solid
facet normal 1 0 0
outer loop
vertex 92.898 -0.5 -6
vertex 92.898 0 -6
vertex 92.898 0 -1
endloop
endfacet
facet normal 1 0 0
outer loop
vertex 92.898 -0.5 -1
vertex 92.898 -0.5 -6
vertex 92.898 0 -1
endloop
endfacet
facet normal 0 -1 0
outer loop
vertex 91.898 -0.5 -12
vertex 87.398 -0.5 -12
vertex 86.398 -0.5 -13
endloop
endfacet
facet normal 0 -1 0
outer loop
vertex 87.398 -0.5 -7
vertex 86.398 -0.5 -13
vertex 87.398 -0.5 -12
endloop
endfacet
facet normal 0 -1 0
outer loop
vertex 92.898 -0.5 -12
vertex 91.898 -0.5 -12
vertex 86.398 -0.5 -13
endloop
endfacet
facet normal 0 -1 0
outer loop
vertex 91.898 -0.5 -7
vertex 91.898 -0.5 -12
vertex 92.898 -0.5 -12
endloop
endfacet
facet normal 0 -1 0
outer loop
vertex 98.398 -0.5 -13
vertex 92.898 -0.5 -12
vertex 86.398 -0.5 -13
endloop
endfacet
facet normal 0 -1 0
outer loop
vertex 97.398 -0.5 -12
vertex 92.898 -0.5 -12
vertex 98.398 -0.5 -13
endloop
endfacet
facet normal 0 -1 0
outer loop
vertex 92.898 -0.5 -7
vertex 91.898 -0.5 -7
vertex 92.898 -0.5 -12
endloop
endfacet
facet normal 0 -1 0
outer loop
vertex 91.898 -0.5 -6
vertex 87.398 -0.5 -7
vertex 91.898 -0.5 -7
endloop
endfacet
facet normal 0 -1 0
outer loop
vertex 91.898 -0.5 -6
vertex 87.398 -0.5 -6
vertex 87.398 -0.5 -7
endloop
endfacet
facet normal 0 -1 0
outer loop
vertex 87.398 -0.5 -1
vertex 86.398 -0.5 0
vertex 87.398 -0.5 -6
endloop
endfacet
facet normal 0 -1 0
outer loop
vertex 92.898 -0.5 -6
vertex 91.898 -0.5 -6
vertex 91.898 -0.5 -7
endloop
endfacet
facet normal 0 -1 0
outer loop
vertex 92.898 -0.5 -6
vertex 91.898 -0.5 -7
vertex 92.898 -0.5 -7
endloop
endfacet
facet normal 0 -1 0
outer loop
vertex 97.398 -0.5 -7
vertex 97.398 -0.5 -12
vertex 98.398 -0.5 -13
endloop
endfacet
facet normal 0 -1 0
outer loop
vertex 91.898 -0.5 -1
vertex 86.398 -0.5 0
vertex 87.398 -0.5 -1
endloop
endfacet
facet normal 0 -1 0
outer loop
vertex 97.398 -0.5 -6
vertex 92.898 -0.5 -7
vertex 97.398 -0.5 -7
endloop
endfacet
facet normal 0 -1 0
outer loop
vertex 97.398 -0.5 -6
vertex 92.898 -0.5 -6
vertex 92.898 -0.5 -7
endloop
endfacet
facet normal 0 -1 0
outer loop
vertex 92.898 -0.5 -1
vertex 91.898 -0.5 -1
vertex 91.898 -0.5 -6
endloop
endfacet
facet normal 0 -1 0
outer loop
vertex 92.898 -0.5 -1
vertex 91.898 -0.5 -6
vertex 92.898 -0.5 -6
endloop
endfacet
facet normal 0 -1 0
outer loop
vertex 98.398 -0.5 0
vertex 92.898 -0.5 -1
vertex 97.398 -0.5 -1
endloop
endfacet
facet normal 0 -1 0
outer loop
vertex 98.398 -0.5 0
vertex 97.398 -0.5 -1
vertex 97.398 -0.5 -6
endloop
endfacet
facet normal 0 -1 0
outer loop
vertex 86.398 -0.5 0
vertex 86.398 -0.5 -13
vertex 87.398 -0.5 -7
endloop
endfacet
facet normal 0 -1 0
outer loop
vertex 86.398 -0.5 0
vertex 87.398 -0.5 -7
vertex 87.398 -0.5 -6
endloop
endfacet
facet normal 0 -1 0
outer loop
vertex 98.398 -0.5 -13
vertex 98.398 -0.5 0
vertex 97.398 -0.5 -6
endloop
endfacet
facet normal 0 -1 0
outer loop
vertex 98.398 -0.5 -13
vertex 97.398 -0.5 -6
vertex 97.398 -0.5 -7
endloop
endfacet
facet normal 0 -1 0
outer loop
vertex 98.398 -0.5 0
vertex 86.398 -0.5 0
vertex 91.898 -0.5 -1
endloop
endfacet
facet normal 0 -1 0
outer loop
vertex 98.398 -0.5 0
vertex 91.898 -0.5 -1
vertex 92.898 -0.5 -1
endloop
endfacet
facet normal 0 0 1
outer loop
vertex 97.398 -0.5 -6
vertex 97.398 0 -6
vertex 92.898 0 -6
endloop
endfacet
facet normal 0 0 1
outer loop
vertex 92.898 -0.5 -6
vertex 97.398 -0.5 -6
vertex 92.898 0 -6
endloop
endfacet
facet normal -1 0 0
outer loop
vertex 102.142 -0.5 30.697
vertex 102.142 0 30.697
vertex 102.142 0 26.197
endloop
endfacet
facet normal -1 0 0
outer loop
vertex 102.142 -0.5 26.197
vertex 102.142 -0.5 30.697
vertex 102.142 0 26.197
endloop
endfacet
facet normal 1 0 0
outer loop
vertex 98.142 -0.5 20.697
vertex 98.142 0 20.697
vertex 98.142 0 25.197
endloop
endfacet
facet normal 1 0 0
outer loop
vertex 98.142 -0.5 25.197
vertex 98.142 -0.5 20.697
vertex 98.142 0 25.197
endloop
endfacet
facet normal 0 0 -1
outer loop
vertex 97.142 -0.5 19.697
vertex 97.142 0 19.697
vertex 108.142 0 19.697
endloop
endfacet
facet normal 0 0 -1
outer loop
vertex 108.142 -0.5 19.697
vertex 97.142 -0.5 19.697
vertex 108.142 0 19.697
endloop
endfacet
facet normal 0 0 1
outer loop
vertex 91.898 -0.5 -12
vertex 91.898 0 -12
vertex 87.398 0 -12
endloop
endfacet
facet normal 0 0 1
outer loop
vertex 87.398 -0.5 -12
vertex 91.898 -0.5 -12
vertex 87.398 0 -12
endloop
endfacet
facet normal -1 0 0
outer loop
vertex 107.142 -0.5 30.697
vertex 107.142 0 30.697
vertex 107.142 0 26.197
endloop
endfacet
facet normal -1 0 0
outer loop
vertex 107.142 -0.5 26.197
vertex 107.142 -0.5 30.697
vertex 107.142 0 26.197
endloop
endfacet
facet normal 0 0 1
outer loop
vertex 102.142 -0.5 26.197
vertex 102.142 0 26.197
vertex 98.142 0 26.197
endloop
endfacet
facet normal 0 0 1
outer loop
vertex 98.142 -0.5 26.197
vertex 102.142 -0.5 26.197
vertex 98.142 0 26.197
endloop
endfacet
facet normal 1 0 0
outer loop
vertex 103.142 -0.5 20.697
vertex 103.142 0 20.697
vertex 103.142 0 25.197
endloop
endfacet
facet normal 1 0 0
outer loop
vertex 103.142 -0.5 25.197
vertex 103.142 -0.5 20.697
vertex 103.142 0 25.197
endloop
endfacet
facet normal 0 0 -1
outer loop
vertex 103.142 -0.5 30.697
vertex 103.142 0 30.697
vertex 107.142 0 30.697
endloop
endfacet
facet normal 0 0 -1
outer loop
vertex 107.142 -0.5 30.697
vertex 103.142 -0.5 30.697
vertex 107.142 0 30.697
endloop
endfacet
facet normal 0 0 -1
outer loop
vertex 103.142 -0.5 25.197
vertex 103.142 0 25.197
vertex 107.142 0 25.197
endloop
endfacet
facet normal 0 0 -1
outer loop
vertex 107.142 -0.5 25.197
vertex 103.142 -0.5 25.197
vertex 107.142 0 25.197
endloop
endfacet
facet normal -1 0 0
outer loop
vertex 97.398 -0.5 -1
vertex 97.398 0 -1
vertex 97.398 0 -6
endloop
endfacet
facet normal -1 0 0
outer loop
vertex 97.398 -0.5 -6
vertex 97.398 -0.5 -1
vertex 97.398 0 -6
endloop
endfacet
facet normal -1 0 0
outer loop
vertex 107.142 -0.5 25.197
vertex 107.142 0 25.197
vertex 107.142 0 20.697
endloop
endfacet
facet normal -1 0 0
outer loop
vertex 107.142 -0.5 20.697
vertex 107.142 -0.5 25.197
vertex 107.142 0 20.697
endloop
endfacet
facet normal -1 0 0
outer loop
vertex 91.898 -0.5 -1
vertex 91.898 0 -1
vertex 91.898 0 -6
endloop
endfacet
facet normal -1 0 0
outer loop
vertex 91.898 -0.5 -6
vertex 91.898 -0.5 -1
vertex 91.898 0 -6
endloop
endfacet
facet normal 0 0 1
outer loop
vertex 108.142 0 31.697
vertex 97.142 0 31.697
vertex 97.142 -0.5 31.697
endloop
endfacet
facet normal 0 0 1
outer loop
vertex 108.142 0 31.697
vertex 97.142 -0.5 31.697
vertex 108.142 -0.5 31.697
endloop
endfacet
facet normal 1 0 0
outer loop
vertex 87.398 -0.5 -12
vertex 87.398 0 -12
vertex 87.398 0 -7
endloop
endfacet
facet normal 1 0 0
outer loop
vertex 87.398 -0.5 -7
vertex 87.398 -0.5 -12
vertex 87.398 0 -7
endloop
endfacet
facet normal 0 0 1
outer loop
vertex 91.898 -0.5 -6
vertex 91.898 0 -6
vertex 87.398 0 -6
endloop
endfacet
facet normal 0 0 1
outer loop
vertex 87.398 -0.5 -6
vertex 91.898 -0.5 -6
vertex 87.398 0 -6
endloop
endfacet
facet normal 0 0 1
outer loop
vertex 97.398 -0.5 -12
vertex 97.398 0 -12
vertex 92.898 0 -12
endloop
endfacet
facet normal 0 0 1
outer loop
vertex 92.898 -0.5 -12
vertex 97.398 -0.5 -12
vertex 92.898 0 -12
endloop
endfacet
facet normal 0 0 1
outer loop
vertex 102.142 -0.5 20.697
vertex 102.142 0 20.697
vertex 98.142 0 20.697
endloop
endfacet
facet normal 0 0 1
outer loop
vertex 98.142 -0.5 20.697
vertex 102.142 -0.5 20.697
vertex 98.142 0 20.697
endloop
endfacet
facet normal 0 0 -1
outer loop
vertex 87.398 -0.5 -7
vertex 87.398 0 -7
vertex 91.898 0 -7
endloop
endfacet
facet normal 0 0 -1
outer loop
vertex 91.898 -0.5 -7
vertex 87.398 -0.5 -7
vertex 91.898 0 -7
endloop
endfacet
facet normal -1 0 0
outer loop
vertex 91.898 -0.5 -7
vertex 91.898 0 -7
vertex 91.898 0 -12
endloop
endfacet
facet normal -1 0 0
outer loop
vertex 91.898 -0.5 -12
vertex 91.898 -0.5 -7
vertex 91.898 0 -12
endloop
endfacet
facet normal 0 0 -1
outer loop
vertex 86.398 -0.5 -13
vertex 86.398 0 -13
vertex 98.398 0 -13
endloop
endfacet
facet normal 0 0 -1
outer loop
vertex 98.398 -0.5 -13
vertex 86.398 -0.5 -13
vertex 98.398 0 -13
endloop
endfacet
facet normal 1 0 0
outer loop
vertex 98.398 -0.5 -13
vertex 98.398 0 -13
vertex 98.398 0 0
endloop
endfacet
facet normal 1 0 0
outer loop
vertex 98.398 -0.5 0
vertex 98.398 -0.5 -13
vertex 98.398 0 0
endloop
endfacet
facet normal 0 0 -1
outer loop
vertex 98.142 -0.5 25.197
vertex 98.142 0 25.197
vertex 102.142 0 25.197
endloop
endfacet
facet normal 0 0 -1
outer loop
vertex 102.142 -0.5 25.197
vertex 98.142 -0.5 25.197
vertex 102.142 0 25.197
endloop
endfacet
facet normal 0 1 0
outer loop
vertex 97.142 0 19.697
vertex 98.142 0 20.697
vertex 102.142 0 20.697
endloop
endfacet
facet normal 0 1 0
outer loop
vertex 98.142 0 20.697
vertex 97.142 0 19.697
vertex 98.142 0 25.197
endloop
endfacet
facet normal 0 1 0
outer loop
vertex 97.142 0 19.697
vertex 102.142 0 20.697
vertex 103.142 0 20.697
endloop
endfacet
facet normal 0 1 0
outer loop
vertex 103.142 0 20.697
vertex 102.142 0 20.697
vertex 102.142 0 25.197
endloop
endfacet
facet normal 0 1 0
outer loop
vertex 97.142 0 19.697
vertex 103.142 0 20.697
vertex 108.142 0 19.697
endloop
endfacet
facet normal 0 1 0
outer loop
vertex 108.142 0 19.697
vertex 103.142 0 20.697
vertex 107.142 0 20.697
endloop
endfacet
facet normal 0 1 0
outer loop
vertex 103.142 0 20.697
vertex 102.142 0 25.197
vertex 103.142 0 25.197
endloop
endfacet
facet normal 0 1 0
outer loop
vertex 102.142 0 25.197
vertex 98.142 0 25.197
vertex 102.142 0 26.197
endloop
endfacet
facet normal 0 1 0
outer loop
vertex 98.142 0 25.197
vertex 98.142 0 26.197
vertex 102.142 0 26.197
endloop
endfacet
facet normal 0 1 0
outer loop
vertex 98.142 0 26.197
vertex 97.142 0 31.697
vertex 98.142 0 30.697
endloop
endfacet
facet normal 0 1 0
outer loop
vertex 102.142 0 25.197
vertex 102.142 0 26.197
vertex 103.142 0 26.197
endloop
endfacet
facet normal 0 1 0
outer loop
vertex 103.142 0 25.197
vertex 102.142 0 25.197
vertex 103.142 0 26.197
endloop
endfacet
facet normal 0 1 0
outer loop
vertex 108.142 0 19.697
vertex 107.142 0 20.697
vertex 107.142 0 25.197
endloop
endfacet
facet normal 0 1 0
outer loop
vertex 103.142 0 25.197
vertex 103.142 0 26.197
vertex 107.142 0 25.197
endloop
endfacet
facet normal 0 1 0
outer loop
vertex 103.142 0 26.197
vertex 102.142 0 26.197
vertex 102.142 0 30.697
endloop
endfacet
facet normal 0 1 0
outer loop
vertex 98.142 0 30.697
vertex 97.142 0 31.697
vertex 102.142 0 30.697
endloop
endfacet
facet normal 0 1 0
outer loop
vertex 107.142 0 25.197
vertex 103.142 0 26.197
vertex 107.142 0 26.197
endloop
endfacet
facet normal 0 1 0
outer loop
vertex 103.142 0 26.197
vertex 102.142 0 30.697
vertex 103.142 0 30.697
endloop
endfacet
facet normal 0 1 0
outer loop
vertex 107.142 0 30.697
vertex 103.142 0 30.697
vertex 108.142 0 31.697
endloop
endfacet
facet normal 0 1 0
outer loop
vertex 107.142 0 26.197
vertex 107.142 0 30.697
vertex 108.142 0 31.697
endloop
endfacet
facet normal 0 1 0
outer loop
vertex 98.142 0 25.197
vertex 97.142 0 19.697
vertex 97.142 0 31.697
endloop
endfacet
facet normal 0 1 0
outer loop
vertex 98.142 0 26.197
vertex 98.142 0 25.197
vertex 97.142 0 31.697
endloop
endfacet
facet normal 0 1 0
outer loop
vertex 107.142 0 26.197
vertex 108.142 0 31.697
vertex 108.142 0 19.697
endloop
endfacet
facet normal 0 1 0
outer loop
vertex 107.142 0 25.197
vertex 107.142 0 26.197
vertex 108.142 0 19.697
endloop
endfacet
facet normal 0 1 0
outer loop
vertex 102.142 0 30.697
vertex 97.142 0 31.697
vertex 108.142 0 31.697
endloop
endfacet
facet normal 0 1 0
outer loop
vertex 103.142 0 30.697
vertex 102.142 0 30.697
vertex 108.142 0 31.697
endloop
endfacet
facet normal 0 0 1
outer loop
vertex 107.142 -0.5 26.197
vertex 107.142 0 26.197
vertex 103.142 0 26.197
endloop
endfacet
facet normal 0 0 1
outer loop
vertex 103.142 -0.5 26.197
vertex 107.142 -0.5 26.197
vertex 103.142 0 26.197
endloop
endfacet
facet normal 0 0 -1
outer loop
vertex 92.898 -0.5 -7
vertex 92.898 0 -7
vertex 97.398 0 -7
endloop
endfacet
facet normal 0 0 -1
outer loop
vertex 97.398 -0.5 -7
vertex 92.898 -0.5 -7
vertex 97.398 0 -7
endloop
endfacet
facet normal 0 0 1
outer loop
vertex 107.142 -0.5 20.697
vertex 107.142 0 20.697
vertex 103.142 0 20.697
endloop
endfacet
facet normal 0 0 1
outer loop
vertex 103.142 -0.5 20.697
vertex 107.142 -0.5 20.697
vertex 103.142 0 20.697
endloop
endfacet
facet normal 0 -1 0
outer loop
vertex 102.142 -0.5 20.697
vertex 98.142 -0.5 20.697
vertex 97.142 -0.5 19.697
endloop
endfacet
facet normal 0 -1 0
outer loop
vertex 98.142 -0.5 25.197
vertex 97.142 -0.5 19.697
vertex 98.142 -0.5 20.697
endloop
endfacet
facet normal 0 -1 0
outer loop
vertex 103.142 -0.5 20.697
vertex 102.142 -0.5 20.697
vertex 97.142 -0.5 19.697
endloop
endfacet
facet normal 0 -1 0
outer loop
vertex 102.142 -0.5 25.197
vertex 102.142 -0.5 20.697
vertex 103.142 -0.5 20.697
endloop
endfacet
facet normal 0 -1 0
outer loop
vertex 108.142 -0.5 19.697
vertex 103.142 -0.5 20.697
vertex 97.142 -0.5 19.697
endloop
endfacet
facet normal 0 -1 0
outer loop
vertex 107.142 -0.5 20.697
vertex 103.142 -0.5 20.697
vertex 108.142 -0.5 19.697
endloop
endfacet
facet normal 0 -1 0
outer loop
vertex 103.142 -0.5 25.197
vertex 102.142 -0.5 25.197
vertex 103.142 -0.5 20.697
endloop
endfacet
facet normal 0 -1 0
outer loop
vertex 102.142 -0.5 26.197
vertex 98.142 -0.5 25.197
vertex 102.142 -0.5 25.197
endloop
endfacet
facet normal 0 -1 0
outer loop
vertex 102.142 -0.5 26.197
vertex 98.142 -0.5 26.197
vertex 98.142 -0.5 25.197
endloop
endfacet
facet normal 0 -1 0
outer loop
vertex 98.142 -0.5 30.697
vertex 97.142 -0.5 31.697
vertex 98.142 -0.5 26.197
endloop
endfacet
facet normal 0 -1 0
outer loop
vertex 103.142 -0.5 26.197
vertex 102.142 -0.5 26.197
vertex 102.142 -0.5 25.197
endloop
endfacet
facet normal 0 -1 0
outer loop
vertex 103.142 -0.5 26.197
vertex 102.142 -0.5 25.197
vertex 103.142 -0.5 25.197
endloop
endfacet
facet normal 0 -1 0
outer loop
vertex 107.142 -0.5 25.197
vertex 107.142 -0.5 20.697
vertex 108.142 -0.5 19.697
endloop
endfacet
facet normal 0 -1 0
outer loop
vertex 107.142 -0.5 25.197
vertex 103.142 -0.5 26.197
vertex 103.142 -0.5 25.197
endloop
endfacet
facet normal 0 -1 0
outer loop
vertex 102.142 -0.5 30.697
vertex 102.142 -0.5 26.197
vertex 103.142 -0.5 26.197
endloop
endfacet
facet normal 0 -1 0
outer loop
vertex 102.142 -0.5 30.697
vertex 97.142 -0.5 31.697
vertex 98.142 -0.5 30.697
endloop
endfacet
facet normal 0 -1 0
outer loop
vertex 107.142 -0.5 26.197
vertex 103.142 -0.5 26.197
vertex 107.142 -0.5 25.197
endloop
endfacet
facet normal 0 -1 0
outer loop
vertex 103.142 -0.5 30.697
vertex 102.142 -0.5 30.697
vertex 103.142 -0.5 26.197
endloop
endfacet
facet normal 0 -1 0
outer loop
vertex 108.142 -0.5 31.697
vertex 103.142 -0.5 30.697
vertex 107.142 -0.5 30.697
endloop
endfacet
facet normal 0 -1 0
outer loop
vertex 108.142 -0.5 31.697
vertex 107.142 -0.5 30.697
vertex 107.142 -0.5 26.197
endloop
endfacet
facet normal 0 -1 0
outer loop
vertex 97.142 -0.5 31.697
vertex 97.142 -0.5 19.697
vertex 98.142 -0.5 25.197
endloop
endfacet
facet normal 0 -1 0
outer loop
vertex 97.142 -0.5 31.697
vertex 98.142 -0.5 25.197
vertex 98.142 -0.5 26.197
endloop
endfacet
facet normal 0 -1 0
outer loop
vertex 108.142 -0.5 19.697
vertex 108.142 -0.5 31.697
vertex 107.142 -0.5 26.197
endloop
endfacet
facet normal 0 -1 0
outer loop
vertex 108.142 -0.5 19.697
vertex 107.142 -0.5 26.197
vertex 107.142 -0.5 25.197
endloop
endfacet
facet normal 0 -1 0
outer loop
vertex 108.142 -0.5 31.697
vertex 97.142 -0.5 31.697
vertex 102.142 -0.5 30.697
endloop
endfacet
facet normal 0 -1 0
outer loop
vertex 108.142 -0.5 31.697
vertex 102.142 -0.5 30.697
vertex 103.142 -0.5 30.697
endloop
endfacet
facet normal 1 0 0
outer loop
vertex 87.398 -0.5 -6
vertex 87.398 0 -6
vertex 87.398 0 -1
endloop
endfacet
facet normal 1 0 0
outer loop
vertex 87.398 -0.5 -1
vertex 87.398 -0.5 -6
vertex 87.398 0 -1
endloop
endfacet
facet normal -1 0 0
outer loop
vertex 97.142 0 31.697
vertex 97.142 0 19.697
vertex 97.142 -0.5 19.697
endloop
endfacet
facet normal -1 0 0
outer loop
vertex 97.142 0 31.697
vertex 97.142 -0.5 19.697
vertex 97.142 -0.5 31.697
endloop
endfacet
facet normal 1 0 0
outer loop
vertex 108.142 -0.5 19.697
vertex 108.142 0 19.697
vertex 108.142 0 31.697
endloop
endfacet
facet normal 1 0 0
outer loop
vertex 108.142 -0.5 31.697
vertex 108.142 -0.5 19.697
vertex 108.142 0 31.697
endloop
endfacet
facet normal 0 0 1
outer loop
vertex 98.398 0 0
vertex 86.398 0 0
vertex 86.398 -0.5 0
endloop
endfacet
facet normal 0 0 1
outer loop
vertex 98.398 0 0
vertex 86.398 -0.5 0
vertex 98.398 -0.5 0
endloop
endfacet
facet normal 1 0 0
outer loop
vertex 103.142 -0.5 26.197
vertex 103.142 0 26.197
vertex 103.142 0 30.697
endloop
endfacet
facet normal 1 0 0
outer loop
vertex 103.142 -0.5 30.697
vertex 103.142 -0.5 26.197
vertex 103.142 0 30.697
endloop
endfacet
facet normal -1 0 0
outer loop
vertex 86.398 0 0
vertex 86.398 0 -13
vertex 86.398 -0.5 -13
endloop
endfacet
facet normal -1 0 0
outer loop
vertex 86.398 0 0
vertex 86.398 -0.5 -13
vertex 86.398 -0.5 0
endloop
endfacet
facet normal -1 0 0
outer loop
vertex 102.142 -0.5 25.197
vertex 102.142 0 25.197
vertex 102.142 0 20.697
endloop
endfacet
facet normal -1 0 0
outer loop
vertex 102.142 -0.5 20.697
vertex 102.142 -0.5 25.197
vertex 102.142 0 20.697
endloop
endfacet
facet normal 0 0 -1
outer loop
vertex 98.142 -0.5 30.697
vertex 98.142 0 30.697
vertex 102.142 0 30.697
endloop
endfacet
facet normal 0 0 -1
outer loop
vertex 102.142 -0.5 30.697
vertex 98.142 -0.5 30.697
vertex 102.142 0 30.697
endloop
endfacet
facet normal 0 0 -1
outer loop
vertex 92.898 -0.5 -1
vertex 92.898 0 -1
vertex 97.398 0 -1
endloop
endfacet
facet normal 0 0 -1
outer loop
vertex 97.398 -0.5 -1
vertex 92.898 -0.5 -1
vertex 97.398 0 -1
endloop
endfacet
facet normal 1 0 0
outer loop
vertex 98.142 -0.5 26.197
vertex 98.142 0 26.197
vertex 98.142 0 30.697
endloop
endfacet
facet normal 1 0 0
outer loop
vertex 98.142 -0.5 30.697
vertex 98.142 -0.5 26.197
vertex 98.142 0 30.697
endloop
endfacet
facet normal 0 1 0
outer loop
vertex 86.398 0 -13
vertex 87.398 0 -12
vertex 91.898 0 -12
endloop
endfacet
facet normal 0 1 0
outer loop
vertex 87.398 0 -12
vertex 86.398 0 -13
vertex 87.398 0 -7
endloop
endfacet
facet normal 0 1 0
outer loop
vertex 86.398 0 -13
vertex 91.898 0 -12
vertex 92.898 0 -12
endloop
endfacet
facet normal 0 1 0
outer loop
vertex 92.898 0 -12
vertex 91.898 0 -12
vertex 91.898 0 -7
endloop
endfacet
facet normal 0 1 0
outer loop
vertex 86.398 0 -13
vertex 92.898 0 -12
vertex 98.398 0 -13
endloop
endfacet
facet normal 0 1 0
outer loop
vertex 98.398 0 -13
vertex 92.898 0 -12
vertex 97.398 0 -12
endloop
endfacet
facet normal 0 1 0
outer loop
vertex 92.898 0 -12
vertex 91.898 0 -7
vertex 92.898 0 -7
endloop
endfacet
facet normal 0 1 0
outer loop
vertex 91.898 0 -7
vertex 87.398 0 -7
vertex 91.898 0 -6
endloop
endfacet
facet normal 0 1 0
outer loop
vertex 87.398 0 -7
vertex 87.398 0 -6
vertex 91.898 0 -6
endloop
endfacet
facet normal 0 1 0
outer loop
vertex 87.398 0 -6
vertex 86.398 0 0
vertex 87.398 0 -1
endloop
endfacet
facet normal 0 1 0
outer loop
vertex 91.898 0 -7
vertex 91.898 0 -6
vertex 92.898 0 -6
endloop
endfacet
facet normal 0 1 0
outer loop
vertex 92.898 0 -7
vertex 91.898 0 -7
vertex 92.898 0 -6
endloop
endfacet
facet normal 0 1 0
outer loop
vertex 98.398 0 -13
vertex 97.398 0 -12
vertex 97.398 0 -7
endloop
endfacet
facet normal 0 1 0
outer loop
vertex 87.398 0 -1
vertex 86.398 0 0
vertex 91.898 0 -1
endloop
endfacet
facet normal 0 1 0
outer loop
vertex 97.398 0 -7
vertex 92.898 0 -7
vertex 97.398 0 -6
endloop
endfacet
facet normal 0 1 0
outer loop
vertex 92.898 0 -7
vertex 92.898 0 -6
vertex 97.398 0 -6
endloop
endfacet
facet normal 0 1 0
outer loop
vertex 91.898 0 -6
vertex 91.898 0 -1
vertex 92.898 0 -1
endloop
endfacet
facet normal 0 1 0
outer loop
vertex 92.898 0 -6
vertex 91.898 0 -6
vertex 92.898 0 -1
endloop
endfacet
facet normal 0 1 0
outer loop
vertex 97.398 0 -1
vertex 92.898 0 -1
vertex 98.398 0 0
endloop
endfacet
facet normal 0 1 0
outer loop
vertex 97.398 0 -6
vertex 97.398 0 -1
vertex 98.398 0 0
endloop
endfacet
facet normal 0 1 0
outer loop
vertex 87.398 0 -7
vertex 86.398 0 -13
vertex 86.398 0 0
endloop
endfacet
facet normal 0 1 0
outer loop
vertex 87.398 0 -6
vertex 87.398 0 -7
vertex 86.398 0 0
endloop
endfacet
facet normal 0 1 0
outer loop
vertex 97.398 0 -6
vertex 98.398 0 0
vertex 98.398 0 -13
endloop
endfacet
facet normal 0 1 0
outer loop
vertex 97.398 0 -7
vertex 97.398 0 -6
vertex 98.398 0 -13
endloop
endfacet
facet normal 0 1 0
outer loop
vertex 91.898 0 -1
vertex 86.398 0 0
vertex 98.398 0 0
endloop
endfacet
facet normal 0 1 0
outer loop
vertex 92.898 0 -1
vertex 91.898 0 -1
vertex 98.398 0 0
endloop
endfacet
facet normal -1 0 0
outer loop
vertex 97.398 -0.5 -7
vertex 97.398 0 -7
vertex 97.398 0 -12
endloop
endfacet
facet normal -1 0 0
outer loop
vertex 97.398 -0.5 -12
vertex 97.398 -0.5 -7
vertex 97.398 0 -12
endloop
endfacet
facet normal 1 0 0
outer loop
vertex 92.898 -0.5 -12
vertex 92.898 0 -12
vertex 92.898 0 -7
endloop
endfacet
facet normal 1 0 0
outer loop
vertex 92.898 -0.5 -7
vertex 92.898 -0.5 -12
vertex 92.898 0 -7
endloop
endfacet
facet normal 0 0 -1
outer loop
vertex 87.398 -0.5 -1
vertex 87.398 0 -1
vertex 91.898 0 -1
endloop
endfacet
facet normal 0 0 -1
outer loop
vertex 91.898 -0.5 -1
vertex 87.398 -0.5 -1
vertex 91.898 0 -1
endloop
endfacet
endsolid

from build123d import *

# Parameters (mm, degrees)
F0_W     = 11
F0_H     = 12
F0_W_2   = 12
F0_H_2   = 13
F1_DEPTH = 0.5


with BuildPart() as f1:
    # F0 (on Front) → F1 (new body)
    with BuildSketch(Plane.XZ):
        with Locations((102.641743, 25.696947)):
            Rectangle(F0_W, F0_H)
        Polygon((103.141743, 30.696947), (107.141743, 30.696947), (107.141743, 26.196947), (107.141743, 25.196947), (107.141743, 20.696947), (103.141743, 20.696947), (102.141743, 20.696947), (98.141743, 20.696947), (98.141743, 25.196947), (98.141743, 26.196947), (98.141743, 30.696947), (102.141743, 30.696947), align=None, mode=Mode.SUBTRACT)
        Polygon((103.141743, 26.196947), (103.141743, 30.696947), (102.141743, 30.696947), (102.141743, 26.196947), (98.141743, 26.196947), (98.141743, 25.196947), (102.141743, 25.196947), (102.141743, 20.696947), (103.141743, 20.696947), (103.141743, 25.196947), (107.141743, 25.196947), (107.141743, 26.196947), align=None)
        with Locations((92.397953, -6.5)):
            Rectangle(F0_W_2, F0_H_2)
        Polygon((92.897953, -1), (97.397953, -1), (97.397953, -6), (97.397953, -7), (97.397953, -12), (92.897953, -12), (91.897953, -12), (87.397953, -12), (87.397953, -7), (87.397953, -6), (87.397953, -1), (91.897953, -1), align=None, mode=Mode.SUBTRACT)
        Polygon((92.897953, -6), (92.897953, -1), (91.897953, -1), (91.897953, -6), (87.397953, -6), (87.397953, -7), (91.897953, -7), (91.897953, -12), (92.897953, -12), (92.897953, -7), (97.397953, -7), (97.397953, -6), align=None)
    extrude(amount=F1_DEPTH)


solid = f1.part
